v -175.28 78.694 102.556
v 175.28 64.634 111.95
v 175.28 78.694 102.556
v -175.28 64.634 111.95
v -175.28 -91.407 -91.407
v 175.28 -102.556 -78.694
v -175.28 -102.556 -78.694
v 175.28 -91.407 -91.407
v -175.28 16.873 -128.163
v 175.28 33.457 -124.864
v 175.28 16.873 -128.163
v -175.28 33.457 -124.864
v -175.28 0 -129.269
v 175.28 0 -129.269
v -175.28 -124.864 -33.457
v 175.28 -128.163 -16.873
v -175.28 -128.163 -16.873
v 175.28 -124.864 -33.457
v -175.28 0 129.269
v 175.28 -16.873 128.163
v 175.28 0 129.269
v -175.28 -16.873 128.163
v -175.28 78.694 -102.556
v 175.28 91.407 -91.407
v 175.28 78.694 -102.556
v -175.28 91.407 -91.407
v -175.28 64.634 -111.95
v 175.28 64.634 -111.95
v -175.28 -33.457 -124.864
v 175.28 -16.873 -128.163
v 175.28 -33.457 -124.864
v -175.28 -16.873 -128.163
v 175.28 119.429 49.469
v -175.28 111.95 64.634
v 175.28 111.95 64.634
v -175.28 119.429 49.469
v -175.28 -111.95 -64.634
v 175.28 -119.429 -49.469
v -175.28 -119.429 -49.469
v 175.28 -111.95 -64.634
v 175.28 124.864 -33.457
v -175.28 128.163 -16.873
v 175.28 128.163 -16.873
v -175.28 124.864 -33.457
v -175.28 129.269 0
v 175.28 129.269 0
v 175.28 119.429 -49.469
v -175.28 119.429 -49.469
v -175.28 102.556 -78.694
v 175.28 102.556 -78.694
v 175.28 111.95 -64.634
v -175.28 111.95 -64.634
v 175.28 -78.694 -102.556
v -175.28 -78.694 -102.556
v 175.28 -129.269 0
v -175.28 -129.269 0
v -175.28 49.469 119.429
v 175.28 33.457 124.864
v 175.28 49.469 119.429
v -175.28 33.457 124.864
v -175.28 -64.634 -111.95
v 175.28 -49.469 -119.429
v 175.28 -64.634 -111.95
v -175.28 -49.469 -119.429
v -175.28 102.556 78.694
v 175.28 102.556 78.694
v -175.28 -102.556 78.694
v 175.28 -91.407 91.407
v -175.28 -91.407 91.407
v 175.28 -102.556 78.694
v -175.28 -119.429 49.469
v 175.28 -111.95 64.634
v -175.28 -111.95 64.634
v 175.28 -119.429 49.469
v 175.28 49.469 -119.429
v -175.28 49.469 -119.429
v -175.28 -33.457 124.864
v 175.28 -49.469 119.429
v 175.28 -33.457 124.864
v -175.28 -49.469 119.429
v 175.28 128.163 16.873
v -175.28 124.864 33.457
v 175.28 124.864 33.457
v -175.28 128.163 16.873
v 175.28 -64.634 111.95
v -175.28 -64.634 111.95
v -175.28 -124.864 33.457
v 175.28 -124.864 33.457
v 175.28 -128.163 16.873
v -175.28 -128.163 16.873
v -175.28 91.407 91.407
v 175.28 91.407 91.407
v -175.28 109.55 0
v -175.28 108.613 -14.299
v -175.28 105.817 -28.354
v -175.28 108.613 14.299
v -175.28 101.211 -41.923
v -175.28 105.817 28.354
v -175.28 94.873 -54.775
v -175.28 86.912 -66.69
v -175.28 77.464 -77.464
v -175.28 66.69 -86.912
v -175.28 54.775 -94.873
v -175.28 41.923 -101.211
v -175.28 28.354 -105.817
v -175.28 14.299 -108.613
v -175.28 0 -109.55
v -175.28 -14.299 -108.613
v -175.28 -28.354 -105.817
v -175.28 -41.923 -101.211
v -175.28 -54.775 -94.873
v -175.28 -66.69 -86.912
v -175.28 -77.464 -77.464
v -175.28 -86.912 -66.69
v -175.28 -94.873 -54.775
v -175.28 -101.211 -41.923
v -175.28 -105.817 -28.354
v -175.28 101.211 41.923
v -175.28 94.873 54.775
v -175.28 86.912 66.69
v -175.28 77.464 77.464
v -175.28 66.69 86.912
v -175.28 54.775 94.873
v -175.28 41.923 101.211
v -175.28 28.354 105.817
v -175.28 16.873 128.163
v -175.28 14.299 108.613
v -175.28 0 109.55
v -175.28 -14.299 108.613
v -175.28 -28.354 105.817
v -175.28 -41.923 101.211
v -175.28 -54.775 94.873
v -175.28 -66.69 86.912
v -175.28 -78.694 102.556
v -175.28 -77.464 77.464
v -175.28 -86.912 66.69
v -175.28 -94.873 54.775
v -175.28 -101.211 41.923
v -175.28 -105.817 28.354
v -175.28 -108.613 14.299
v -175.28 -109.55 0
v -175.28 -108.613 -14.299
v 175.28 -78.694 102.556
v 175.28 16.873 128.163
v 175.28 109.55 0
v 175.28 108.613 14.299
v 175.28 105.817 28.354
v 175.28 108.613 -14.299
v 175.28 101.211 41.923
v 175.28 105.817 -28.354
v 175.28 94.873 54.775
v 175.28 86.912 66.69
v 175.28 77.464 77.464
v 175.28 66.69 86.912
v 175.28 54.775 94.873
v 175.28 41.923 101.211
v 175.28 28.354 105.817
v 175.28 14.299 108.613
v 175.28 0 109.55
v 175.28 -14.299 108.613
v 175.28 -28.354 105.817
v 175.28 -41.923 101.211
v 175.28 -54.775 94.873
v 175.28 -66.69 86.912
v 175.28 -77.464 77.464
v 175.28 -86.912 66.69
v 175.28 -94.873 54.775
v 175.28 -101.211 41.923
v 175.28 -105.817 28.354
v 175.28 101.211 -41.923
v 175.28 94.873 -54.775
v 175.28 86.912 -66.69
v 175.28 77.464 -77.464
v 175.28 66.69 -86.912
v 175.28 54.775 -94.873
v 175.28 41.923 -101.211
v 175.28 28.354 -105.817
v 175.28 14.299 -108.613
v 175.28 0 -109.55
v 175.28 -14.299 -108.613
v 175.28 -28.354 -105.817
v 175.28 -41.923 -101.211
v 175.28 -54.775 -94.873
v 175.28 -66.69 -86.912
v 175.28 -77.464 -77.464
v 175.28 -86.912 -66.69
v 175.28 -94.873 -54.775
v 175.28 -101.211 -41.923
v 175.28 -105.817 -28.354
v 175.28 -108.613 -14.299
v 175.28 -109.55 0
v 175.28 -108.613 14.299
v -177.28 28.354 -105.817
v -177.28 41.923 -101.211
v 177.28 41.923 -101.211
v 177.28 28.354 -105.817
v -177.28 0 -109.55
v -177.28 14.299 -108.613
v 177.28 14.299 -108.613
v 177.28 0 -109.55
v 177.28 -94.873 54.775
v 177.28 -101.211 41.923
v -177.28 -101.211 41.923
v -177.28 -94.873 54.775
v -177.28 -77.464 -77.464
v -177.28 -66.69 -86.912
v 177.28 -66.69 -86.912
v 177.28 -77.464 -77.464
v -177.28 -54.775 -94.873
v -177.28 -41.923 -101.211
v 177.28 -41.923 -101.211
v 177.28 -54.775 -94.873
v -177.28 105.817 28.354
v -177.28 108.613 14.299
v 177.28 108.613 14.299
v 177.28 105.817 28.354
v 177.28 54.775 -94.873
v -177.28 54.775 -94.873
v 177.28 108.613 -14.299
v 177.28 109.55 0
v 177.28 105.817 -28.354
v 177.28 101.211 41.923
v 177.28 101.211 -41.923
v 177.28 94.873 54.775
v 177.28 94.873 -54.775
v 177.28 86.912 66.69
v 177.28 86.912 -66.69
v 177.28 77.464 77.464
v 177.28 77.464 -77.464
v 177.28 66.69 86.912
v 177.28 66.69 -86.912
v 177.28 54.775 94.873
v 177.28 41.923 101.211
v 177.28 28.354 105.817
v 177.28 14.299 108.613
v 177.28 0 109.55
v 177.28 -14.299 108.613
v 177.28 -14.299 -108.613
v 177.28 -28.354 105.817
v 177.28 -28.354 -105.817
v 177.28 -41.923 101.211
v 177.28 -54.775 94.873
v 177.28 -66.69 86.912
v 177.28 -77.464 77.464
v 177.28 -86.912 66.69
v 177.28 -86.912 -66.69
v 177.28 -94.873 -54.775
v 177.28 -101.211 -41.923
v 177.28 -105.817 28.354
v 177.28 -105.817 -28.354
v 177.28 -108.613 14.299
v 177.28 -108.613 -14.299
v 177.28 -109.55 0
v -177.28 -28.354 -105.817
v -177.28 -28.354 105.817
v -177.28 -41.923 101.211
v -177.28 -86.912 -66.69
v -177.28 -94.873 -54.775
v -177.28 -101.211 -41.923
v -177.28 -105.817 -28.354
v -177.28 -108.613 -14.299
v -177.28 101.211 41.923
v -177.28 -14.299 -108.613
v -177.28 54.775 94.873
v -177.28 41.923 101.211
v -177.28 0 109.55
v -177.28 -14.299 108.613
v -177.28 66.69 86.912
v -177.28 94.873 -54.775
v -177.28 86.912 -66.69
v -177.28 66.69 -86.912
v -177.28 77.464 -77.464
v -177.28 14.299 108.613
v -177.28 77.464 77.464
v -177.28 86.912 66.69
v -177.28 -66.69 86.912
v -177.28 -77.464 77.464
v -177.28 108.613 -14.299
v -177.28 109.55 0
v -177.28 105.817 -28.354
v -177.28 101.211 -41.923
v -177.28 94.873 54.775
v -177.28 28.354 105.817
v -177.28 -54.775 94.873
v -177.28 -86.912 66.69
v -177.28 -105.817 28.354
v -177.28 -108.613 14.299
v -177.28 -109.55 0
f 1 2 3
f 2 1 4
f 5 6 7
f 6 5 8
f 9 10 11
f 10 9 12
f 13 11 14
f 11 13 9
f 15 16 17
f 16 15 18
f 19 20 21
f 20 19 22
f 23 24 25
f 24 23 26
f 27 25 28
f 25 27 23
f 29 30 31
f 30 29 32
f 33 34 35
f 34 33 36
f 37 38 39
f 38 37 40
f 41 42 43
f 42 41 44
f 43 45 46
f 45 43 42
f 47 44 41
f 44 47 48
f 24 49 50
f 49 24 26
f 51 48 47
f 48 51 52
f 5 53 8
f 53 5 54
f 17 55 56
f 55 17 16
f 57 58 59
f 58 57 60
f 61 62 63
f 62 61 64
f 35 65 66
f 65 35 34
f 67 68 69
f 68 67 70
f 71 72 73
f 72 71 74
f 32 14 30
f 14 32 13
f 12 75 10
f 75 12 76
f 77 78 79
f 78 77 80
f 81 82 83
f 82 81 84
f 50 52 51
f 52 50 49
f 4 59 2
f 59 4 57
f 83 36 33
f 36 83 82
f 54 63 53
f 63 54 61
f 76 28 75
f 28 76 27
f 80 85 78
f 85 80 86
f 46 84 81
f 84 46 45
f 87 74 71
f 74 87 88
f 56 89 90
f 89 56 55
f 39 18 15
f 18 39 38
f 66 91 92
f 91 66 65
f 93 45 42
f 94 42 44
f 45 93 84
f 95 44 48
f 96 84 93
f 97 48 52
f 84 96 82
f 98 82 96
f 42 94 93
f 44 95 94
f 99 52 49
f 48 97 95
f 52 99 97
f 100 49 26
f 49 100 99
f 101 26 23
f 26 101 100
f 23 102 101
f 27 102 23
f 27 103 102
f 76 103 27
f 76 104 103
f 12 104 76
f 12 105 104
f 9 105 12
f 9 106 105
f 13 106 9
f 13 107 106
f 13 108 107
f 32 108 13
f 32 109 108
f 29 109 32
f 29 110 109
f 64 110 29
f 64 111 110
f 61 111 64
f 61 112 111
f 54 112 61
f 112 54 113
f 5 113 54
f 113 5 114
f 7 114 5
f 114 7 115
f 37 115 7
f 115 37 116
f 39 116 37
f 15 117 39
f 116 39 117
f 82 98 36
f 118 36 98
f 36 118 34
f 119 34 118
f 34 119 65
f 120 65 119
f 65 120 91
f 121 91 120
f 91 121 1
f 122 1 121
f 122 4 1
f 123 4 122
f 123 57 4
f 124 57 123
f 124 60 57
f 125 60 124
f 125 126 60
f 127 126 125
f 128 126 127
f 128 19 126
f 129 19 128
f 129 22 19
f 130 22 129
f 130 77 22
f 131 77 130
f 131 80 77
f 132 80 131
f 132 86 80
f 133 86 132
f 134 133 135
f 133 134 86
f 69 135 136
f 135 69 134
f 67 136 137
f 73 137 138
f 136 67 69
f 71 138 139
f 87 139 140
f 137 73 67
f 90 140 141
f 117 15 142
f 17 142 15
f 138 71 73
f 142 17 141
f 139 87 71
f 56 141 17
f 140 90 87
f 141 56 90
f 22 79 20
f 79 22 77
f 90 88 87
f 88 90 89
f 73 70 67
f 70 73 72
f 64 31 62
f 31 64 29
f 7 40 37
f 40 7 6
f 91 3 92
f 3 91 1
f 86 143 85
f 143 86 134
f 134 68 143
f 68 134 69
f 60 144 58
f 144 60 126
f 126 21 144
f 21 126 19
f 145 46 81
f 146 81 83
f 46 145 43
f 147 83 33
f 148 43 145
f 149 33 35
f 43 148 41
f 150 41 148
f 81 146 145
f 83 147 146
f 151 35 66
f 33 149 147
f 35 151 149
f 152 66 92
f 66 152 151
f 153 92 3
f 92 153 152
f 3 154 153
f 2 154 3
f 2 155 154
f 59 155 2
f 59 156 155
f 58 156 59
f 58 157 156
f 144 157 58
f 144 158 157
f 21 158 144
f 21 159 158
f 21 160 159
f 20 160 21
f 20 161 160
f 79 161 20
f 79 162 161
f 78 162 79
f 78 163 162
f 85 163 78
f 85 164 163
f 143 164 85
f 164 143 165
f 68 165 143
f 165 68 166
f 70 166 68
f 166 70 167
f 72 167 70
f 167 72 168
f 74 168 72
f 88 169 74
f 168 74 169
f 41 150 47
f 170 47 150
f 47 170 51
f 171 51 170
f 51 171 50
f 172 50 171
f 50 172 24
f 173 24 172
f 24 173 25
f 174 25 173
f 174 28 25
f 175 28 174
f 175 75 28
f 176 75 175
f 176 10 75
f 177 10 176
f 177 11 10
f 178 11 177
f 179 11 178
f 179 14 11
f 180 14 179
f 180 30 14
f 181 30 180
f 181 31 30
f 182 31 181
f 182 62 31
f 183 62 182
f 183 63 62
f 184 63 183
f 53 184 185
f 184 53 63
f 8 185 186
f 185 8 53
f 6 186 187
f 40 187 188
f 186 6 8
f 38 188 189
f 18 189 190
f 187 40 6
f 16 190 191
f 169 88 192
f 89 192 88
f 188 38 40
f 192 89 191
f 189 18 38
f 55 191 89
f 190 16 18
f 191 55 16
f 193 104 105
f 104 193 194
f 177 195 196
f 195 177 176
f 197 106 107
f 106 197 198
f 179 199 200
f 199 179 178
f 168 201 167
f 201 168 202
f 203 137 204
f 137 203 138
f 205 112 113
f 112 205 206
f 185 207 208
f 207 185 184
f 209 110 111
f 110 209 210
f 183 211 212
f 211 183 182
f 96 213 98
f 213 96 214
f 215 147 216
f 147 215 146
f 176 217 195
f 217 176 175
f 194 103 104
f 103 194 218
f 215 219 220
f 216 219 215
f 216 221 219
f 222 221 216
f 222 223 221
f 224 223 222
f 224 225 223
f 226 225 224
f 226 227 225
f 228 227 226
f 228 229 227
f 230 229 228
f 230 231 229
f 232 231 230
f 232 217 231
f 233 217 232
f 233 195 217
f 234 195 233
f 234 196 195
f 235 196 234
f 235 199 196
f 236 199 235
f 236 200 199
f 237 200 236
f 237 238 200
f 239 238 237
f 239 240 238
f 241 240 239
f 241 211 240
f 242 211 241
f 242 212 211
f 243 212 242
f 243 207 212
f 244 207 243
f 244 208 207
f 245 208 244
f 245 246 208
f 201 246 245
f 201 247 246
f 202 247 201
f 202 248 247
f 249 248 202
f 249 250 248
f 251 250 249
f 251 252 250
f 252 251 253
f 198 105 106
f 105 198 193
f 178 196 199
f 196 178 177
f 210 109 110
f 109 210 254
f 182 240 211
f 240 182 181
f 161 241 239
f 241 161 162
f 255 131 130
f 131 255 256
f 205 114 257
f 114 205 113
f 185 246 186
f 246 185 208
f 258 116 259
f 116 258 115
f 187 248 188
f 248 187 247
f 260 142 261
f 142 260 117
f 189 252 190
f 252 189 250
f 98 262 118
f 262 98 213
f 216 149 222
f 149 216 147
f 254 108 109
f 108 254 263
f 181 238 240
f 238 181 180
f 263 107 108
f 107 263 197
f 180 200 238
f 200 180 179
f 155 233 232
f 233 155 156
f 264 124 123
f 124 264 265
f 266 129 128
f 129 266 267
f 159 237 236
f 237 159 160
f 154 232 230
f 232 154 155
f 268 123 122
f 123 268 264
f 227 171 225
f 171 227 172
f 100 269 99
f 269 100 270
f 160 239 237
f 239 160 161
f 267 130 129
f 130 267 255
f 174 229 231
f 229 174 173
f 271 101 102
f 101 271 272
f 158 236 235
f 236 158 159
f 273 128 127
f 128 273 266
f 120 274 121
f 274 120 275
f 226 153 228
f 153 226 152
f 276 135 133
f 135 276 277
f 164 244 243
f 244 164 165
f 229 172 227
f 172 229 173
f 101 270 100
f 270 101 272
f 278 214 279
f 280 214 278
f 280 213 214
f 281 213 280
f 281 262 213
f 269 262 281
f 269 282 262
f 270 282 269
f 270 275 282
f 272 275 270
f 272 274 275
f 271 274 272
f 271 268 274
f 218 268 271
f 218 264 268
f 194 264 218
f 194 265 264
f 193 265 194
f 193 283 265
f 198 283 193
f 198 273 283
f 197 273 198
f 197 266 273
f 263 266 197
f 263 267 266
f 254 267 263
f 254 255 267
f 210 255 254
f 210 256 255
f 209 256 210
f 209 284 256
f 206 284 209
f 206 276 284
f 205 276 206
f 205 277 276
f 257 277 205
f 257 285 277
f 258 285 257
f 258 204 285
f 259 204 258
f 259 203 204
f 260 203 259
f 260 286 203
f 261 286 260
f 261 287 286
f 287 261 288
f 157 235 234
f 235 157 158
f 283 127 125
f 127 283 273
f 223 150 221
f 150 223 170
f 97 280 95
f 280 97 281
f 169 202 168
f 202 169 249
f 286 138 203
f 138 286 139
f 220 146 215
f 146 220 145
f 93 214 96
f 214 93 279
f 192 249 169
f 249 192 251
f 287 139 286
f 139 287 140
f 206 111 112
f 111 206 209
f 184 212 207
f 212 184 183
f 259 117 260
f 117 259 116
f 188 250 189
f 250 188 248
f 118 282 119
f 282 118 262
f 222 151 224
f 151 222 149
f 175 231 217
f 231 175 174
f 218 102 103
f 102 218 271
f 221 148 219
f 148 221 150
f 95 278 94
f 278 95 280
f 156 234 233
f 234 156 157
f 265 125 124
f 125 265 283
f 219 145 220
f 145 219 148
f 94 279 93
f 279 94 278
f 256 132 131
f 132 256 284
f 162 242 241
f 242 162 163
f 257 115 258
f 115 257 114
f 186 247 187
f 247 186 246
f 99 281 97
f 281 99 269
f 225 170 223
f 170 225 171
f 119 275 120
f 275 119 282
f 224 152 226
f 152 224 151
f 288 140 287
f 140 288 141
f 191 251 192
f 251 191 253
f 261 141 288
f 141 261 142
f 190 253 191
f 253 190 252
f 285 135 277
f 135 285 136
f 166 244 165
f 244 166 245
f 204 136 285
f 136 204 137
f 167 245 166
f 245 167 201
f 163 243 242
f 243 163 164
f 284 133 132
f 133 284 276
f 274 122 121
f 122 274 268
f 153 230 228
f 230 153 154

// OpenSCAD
// Auto-generated by scripts/author_from_manifest.py (Phase D.3).
// Source: data/phase_d_manifest.json (sku_intent='victaulic-005-rigid-coupling-8in').
// Do not hand-edit — regenerate from the manifest.
//
// @part victaulic_005_rigid_coupling_8in
// @kind fitting
// @category fitting.coupling
// @display-name "Victaulic FireLock Style 005 Rigid Coupling 8\""
// @mfg victaulic
// @mfg-pn Style_005_8in
// @listing UL FM
// @price-usd 56.00
// @install-minutes 6
// @crew journeyman
// @param size_in number default=8 label="Size" unit="in"
// @port inlet position=[-0.05,0,0] direction=[-1,0,0] style=grooved size_in=8 role=run_a
// @port outlet position=[0.05,0,0] direction=[1,0,0] style=grooved size_in=8 role=run_b

size_in = 8.0;

function od_mm(nps) =
    nps ==   1  ? 33.4 :
    nps == 1.25 ? 42.2 :
    nps == 1.5  ? 48.3 :
    nps ==   2  ? 60.3 :
    nps == 2.5  ? 73.0 :
    nps ==   3  ? 88.9 :
    nps ==   4  ? 114.3 :
    nps ==   5  ? 141.3 :
    nps ==   6  ? 168.3 :
    nps ==   8  ? 219.1 :
    nps ==  10  ? 273.0 : 60.3;

od = od_mm(size_in);
len_mm = od * 1.6;

rotate([0, 90, 0])
    union() {
        cylinder(h = len_mm, d = od * 1.18, center = true, $fn = 48);
        cylinder(h = len_mm + 4, d = od, center = true, $fn = 48);
    }
